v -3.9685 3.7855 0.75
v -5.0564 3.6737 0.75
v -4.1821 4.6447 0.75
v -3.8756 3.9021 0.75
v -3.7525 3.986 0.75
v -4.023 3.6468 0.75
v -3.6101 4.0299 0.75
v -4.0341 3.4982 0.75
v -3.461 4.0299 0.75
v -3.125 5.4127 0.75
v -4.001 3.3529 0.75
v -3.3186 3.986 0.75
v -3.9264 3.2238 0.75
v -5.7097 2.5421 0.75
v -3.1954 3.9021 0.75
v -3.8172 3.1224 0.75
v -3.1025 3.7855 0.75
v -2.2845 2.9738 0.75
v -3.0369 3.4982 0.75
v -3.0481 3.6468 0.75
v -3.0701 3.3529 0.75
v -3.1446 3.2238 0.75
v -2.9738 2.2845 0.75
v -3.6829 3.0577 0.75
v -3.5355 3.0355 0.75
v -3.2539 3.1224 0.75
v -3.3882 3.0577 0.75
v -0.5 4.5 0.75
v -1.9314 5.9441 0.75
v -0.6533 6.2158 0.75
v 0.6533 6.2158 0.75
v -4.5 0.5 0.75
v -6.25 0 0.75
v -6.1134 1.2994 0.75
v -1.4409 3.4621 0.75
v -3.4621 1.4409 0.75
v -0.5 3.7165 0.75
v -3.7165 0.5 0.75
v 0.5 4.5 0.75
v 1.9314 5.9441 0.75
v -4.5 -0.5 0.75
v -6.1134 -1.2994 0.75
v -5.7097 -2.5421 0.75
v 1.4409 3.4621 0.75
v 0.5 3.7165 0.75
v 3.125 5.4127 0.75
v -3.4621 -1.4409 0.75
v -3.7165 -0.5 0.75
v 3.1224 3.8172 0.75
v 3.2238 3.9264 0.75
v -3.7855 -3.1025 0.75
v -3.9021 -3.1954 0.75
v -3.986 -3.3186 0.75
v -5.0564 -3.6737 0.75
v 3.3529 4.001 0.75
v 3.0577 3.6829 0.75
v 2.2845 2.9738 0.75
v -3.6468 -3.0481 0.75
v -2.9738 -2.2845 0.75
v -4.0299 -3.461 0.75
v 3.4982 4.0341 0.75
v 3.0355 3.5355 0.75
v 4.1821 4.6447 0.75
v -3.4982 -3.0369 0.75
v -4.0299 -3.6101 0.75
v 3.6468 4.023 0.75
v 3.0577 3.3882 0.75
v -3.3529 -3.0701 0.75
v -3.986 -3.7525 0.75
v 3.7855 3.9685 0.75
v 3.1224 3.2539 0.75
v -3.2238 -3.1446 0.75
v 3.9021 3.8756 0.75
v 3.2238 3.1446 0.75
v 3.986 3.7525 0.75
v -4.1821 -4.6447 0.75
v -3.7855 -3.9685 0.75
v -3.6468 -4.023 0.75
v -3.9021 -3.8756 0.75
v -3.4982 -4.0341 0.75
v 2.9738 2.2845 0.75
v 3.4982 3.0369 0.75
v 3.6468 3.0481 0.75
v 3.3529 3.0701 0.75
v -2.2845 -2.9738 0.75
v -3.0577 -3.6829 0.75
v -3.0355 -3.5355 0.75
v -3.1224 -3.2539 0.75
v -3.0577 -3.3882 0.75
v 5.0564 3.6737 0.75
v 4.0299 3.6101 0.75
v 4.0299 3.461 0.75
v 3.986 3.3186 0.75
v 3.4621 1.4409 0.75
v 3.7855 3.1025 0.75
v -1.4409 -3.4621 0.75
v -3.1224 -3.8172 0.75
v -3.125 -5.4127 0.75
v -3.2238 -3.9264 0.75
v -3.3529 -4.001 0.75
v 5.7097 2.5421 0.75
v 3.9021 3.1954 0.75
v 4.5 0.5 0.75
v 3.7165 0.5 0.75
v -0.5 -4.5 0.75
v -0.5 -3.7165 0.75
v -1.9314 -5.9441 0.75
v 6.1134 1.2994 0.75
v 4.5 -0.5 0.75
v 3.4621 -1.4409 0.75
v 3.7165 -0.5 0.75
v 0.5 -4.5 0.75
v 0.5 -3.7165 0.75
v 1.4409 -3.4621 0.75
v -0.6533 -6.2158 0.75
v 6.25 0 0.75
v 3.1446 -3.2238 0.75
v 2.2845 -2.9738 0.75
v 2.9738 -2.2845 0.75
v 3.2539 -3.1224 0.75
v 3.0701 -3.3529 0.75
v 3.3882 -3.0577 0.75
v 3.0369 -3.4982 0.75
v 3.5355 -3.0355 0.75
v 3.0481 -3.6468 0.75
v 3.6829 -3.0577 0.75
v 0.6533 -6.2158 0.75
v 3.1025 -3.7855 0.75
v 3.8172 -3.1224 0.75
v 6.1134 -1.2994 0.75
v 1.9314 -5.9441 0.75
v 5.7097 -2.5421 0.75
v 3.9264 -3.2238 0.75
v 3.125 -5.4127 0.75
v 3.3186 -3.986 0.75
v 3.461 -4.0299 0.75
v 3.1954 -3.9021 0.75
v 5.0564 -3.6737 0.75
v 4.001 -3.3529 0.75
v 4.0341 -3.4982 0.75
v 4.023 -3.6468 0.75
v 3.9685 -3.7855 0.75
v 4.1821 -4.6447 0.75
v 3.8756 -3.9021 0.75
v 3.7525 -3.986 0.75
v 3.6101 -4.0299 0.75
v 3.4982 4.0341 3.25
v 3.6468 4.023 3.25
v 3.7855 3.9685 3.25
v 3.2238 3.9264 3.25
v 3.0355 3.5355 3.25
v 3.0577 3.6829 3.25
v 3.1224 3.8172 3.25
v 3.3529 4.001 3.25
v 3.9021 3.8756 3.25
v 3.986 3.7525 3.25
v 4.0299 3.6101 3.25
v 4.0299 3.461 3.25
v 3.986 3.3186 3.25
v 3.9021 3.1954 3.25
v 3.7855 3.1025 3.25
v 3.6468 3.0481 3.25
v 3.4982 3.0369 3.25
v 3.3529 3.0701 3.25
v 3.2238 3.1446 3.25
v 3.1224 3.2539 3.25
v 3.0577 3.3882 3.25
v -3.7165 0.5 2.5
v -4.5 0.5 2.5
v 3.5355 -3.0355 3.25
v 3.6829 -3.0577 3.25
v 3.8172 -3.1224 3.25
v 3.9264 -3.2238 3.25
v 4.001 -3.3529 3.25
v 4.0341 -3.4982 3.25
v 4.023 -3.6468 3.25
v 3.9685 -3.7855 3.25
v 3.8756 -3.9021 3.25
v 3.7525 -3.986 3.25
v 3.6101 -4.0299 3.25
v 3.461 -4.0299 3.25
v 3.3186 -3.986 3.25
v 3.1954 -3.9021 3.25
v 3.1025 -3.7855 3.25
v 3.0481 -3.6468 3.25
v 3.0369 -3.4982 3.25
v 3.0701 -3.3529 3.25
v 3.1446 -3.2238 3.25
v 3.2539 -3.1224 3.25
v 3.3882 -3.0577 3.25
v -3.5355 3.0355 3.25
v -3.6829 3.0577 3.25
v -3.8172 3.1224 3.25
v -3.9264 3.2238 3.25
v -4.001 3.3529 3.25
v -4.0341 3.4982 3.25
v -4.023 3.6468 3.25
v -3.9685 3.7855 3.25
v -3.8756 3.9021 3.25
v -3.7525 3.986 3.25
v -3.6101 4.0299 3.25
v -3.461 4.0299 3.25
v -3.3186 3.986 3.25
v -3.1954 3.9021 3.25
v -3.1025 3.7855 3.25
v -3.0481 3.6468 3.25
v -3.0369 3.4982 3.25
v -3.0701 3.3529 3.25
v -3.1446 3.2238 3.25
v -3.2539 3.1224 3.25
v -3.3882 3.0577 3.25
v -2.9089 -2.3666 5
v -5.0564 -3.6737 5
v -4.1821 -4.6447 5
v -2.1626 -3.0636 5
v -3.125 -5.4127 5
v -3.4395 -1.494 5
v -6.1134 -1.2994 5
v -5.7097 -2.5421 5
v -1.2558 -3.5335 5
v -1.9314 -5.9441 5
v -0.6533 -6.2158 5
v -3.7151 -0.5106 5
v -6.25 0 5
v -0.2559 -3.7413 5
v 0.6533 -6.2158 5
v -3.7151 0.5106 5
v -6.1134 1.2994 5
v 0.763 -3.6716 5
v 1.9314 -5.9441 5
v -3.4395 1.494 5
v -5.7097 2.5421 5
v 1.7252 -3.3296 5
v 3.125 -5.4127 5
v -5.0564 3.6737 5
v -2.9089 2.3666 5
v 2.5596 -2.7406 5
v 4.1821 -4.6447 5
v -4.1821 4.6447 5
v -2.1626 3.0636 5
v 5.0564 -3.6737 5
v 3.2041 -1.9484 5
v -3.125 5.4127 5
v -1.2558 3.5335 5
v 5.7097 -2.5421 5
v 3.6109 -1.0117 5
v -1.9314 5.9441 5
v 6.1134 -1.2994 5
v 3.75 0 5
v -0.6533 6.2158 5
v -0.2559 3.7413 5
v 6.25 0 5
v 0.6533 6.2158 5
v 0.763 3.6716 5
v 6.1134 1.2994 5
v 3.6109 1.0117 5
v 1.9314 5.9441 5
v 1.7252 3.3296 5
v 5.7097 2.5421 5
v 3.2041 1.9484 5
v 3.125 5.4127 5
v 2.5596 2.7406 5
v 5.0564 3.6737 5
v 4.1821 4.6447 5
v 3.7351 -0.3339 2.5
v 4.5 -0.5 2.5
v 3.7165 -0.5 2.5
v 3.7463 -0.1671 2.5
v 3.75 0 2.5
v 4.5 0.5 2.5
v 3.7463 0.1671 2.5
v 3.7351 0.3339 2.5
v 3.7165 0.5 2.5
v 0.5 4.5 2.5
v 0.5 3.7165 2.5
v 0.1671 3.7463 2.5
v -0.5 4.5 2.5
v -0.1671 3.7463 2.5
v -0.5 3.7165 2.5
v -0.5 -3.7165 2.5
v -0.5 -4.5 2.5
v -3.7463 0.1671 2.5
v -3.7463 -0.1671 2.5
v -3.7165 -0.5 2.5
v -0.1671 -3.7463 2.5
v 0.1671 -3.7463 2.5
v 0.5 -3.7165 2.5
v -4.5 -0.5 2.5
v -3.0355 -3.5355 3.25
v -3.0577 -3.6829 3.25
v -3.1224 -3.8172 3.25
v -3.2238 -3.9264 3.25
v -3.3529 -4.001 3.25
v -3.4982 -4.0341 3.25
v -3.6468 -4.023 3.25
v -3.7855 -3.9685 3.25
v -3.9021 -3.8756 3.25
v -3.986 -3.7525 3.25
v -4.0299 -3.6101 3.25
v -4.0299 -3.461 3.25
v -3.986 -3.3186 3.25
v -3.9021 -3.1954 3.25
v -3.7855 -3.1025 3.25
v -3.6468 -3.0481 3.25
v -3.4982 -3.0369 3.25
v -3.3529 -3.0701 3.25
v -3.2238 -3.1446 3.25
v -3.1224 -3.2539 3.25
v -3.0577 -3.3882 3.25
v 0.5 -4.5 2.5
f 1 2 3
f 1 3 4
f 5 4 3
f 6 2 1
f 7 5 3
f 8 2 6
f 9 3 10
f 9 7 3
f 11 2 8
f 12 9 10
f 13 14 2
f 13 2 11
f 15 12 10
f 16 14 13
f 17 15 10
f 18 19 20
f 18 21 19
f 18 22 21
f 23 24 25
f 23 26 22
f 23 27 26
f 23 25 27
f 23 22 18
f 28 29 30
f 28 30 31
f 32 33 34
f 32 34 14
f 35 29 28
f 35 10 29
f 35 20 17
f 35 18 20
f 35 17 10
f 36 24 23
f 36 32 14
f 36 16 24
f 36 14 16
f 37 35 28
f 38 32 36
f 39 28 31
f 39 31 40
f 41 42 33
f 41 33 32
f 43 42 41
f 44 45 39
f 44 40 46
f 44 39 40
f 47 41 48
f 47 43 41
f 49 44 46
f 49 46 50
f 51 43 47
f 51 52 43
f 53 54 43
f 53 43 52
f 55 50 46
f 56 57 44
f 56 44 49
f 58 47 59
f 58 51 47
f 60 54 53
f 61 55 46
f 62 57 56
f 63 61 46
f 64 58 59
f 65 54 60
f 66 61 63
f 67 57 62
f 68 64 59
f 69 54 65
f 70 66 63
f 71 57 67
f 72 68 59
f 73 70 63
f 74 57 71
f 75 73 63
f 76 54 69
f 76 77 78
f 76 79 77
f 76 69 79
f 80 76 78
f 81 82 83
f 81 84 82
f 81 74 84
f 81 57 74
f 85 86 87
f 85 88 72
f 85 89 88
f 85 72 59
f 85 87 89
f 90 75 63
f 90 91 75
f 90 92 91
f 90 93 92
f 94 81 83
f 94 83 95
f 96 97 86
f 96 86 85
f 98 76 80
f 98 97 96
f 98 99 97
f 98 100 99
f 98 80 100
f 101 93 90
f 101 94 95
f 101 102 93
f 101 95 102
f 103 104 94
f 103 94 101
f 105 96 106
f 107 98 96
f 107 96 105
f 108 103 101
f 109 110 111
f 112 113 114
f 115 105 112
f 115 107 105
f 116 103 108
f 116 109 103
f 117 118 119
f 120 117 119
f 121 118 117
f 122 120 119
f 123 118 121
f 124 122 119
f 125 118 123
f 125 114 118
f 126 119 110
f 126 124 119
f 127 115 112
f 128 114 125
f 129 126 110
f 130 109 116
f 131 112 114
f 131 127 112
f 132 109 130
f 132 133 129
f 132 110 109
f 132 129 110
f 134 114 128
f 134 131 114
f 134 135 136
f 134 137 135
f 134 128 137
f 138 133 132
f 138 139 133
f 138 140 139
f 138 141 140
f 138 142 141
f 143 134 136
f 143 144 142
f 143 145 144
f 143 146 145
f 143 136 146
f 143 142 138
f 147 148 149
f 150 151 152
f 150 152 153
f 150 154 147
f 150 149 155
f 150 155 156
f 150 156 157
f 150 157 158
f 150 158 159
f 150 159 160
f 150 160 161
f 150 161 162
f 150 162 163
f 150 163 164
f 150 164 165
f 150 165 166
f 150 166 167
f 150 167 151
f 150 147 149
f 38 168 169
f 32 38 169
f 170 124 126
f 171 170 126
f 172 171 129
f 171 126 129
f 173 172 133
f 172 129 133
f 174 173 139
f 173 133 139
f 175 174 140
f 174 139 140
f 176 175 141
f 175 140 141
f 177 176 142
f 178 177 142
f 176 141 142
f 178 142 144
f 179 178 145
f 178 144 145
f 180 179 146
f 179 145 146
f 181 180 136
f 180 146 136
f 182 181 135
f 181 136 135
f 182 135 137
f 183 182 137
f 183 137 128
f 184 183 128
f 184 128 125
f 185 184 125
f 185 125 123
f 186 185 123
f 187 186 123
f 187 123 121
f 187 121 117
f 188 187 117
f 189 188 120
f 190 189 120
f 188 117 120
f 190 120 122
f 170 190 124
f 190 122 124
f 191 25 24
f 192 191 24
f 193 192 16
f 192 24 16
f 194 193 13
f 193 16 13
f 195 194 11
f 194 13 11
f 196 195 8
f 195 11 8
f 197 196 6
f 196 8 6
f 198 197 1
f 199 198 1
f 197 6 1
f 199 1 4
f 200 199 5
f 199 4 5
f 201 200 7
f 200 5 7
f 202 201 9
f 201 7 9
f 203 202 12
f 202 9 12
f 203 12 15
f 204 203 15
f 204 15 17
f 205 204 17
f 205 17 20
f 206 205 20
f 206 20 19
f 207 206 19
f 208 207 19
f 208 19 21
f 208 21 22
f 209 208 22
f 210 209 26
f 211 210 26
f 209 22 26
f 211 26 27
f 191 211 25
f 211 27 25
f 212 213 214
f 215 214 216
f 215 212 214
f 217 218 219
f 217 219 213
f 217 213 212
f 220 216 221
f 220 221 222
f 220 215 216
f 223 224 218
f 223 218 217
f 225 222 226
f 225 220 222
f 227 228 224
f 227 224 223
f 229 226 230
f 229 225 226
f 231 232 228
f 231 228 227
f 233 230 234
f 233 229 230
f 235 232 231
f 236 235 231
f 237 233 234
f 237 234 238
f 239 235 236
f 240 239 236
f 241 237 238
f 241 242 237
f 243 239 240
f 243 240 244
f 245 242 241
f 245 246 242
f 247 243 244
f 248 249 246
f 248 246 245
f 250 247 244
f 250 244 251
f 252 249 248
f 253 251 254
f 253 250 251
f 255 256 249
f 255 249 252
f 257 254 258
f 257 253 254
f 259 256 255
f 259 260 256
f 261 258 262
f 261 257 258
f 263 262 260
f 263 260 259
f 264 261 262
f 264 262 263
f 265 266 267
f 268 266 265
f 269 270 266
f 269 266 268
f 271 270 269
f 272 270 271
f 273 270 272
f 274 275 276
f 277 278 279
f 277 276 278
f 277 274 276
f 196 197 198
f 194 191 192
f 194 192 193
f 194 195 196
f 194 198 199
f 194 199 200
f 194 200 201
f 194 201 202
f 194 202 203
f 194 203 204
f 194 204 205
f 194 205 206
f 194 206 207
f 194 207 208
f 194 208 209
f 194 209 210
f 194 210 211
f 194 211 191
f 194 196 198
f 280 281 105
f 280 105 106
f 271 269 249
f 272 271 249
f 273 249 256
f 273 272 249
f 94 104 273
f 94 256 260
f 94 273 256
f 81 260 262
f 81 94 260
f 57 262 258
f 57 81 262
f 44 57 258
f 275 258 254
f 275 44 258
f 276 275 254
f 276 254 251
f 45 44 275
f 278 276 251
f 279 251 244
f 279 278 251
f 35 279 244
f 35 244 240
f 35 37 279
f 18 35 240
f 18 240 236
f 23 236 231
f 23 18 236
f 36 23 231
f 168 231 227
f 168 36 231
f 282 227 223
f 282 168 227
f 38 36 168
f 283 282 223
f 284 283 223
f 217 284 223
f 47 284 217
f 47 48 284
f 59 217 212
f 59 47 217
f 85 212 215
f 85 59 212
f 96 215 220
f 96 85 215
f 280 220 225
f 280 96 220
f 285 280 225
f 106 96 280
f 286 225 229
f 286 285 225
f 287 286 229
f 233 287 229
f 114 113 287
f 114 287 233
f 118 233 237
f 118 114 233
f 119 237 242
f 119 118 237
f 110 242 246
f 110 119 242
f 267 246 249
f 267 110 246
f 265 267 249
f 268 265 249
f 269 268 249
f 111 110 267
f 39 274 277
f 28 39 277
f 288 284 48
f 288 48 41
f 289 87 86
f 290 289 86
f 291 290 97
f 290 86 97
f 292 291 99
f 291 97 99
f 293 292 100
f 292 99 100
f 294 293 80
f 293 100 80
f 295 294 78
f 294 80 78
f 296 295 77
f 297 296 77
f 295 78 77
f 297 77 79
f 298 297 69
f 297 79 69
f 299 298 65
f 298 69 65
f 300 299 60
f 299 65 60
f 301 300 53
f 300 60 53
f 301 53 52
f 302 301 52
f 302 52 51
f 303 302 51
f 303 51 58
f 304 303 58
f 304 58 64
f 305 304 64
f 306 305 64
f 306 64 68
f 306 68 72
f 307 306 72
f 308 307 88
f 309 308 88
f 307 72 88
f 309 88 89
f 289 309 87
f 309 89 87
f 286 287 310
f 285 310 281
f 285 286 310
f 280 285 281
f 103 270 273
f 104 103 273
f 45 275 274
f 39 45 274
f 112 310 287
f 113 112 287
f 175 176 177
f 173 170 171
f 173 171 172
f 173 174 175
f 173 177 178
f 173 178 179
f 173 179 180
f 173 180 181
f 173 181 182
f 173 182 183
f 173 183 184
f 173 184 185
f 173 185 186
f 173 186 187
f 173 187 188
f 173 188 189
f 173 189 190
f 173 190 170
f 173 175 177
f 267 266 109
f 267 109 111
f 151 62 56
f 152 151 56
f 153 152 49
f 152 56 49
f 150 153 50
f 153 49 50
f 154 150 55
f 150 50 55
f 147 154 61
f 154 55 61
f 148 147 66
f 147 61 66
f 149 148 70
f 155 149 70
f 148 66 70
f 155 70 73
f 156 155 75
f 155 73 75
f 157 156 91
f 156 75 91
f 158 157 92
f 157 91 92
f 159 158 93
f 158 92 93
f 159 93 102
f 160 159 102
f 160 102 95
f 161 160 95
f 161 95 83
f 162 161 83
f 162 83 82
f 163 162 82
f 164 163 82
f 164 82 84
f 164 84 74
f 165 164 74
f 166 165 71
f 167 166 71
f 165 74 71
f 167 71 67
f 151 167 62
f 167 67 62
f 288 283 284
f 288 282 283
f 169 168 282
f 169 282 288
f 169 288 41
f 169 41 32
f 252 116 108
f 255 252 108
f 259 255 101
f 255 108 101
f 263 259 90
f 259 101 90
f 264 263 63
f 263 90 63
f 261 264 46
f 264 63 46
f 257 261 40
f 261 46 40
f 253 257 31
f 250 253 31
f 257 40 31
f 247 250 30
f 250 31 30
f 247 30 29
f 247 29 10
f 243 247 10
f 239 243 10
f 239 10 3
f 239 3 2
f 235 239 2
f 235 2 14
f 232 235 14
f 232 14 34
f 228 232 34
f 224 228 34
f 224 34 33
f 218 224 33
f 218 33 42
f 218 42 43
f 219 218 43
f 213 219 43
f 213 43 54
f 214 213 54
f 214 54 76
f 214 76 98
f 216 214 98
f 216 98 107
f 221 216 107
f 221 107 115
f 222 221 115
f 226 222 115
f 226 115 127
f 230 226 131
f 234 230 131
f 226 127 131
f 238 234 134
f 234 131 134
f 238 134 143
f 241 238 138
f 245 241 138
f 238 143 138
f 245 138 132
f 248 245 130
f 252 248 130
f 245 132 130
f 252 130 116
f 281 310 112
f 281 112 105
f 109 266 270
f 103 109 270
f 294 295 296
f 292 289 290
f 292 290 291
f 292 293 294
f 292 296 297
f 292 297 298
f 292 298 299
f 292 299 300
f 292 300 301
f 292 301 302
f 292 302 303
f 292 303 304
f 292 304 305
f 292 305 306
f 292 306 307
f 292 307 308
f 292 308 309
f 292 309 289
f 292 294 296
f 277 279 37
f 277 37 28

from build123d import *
from build123d.topology import SkipClean

# Parameters (mm, degrees)
SKETCH1_R               = 6.25
SKETCH1_R_2             = 3.75
BOSS_EXTRUDE1_DEPTH     = 5
BOSS_EXTRUDE2_START     = 3
SKETCH2_R               = 5.5
SKETCH2_R_2             = 3.75
BOSS_EXTRUDE2_DEPTH     = 3
THREAD1_PITCH           = 0.6
BOSS_EXTRUDE3_START     = 1.25
SKETCH7_R               = 5
SKETCH7_R_2             = 3.75
BOSS_EXTRUDE3_DEPTH     = 1.25
CUT_EXTRUDE3_DEPTH      = 6.5
CUT_EXTRUDE3_DEPTH_BACK = 5.5
SKETCH5_W               = 1
SKETCH5_H               = 1
BOSS_EXTRUDE4_START     = 0.5
SKETCH8_R               = 5
SKETCH8_R_2             = 3
BOSS_EXTRUDE4_DEPTH     = 0.5
CUT_EXTRUDE4_DEPTH      = 10
CUT_EXTRUDE4_DEPTH_BACK = 10
SKETCH9_W               = 18.419335543
SKETCH9_H               = 5.81075095
SKETCH10_R              = 0.5
CUT_EXTRUDE5_DEPTH      = 2.5
CIRPATTERN1_COUNT       = 4


with BuildPart() as part:
    # Sketch1 → Boss-Extrude1 (new body)
    with BuildSketch(Plane.XY):
        Circle(SKETCH1_R)
        Circle(SKETCH1_R_2, mode=Mode.SUBTRACT)
    extrude(amount=BOSS_EXTRUDE1_DEPTH)

    # Sketch2 → Boss-Extrude2 (add)
    with SkipClean():  # the faces are left unmerged after this step: merging them gives an invalid solid
        with BuildSketch(Plane(origin=(0, 0, 0), x_dir=(-1, 0, 0), z_dir=(0, 0, -1)).offset(BOSS_EXTRUDE2_START)):
            Circle(SKETCH2_R)
            Circle(SKETCH2_R_2, mode=Mode.SUBTRACT)
        extrude(amount=-BOSS_EXTRUDE2_DEPTH)

    # Thread1: the profile of Thread Profile1 profile screwed along a right-hand helix of 6.666667 turns, 6 arcs to a turn; built about Z, then put on its axis
    with SkipClean():  # the faces are left unmerged after this step: merging them gives an invalid solid
        thread1_z = Axis((0, 0, 0), (0, 0, 1))
        thread1_corners = [(5.5003, 0, -0.000173205), (5.5003, 0, 0.525173203), (5.175240475, 0, 0.337499999), (5.175240475, 0, 0.187499999)]
        with BuildLine(mode=Mode.PRIVATE) as thread1_profile:
            Line(thread1_corners[0], thread1_corners[1])
            Line(thread1_corners[1], thread1_corners[2])
            Line(thread1_corners[2], thread1_corners[3])
            Line(thread1_corners[3], thread1_corners[0])
        thread1_cap = Face(thread1_profile.wire())
        thread1_turn_angles = [0, 30, 60, 90, 120, 150, 180, 210, 240, 270, 300, 330, 360]
        thread1_turn_weights = [1, 0.8660254037844387, 1, 0.8660254037844387, 1, 0.8660254037844387, 1, 0.8660254037844387, 1, 0.8660254037844387, 1, 0.8660254037844387, 1]
        thread1_turn_rails = [Edge.make_bspline([Vector(p[0], p[1], 0).rotate(thread1_z, thread1_turn_angles[k]) / thread1_turn_weights[k] + Vector(0, 0, p[2] + THREAD1_PITCH * thread1_turn_angles[k] / 360) for k in range(13)], [0, 0, 0, 1, 1, 2, 2, 3, 3, 4, 4, 5, 5, 6, 6, 6], 2, thread1_turn_weights) for p in thread1_corners]
        thread1_turn_sides = [Face.make_surface_from_curves(thread1_turn_rails[p[0]], thread1_turn_rails[p[1]]) for p in [(0, 1), (1, 2), (2, 3), (3, 0)]]
        thread1_last_angles = [2160, 2190, 2220, 2250, 2280, 2310, 2340, 2370, 2400]
        thread1_last_weights = [1, 0.8660254037844387, 1, 0.8660254037844387, 1, 0.8660254037844387, 1, 0.8660254037844387, 1]
        thread1_last_rails = [Edge.make_bspline([Vector(p[0], p[1], 0).rotate(thread1_z, thread1_last_angles[k]) / thread1_last_weights[k] + Vector(0, 0, p[2] + THREAD1_PITCH * thread1_last_angles[k] / 360) for k in range(9)], [0, 0, 0, 1, 1, 2, 2, 3, 3, 4, 4, 4], 2, thread1_last_weights) for p in thread1_corners]
        thread1_last_sides = [Face.make_surface_from_curves(thread1_last_rails[p[0]], thread1_last_rails[p[1]]) for p in [(0, 1), (1, 2), (2, 3), (3, 0)]]
        thread1 = Plane(origin=(0, 0, -4), x_dir=(1, 0, 0), z_dir=(0, 0, 1)) * Solid(Shell([*[p.moved(Location((0, 0, THREAD1_PITCH * i))) for i in range(6) for p in thread1_turn_sides], *thread1_last_sides, thread1_cap, thread1_cap.rotate(thread1_z, 2400).moved(Location((0, 0, THREAD1_PITCH * 2400 / 360)))]))
        add(thread1, mode=Mode.SUBTRACT)

    # Sketch7 → Boss-Extrude3 (add)
    with SkipClean():  # the faces are left unmerged after this step: merging them gives an invalid solid
        with BuildSketch(Plane(origin=(0, 0, -3), x_dir=(-1, 0, 0), z_dir=(0, 0, -1)).offset(BOSS_EXTRUDE3_START)):
            Circle(SKETCH7_R)
            Circle(SKETCH7_R_2, mode=Mode.SUBTRACT)
        extrude(amount=-BOSS_EXTRUDE3_DEPTH)

    # Sketch5 → Cut-Extrude3 (cut, two sides: drawn at the far end of the back side and taken through both)
    with BuildSketch(Plane(origin=(0, 0, -3), x_dir=(-1, 0, 0), z_dir=(0, 0, -1)).offset(-CUT_EXTRUDE3_DEPTH_BACK)):
        with Locations((4, 0)):
            Rectangle(SKETCH5_W, SKETCH5_H)
        with Locations((0, 4)):
            Rectangle(SKETCH5_W, SKETCH5_H)
        with Locations((0, -4)):
            Rectangle(SKETCH5_W, SKETCH5_H)
        with Locations((-4, 0)):
            Rectangle(SKETCH5_W, SKETCH5_H)
    extrude(amount=CUT_EXTRUDE3_DEPTH + CUT_EXTRUDE3_DEPTH_BACK, mode=Mode.SUBTRACT)

    # Sketch8 → Boss-Extrude4 (add)
    with BuildSketch(Plane(origin=(0, 0, -4.25), x_dir=(-1, 0, 0), z_dir=(0, 0, -1)).offset(BOSS_EXTRUDE4_START)):
        Circle(SKETCH8_R)
        Circle(SKETCH8_R_2, mode=Mode.SUBTRACT)
    extrude(amount=-BOSS_EXTRUDE4_DEPTH)

    # Sketch9 → Cut-Extrude4 (cut, two sides: drawn at the far end of the back side and taken through both)
    with BuildSketch(Plane(origin=(0, 0, 0), x_dir=(1, 0, 0), z_dir=(0, 1, 0)).offset(-CUT_EXTRUDE4_DEPTH_BACK)):
        with Locations((-0.0093121, 2.155375475)):
            Rectangle(SKETCH9_W, SKETCH9_H)
    extrude(amount=CUT_EXTRUDE4_DEPTH + CUT_EXTRUDE4_DEPTH_BACK, mode=Mode.SUBTRACT)

    # Sketch10 → Cut-Extrude5 (cut)
    with BuildSketch(Plane(origin=(0, 0, 0.75), x_dir=(-1, 0, 0), z_dir=(0, 0, -1))):
        with Locations((-3.535533906, 3.535533906)):
            Circle(SKETCH10_R)
    cut_extrude5 = extrude(amount=-CUT_EXTRUDE5_DEPTH, mode=Mode.SUBTRACT)

    # CirPattern1: Cut-Extrude5 ×4 about axis
    cirpattern1_axis = Axis((0, 0, 0), (0, 0, 1))
    for i in range(1, CIRPATTERN1_COUNT):
        add(cut_extrude5.rotate(cirpattern1_axis, i * 360 / CIRPATTERN1_COUNT), mode=Mode.SUBTRACT)


solid = part.part
